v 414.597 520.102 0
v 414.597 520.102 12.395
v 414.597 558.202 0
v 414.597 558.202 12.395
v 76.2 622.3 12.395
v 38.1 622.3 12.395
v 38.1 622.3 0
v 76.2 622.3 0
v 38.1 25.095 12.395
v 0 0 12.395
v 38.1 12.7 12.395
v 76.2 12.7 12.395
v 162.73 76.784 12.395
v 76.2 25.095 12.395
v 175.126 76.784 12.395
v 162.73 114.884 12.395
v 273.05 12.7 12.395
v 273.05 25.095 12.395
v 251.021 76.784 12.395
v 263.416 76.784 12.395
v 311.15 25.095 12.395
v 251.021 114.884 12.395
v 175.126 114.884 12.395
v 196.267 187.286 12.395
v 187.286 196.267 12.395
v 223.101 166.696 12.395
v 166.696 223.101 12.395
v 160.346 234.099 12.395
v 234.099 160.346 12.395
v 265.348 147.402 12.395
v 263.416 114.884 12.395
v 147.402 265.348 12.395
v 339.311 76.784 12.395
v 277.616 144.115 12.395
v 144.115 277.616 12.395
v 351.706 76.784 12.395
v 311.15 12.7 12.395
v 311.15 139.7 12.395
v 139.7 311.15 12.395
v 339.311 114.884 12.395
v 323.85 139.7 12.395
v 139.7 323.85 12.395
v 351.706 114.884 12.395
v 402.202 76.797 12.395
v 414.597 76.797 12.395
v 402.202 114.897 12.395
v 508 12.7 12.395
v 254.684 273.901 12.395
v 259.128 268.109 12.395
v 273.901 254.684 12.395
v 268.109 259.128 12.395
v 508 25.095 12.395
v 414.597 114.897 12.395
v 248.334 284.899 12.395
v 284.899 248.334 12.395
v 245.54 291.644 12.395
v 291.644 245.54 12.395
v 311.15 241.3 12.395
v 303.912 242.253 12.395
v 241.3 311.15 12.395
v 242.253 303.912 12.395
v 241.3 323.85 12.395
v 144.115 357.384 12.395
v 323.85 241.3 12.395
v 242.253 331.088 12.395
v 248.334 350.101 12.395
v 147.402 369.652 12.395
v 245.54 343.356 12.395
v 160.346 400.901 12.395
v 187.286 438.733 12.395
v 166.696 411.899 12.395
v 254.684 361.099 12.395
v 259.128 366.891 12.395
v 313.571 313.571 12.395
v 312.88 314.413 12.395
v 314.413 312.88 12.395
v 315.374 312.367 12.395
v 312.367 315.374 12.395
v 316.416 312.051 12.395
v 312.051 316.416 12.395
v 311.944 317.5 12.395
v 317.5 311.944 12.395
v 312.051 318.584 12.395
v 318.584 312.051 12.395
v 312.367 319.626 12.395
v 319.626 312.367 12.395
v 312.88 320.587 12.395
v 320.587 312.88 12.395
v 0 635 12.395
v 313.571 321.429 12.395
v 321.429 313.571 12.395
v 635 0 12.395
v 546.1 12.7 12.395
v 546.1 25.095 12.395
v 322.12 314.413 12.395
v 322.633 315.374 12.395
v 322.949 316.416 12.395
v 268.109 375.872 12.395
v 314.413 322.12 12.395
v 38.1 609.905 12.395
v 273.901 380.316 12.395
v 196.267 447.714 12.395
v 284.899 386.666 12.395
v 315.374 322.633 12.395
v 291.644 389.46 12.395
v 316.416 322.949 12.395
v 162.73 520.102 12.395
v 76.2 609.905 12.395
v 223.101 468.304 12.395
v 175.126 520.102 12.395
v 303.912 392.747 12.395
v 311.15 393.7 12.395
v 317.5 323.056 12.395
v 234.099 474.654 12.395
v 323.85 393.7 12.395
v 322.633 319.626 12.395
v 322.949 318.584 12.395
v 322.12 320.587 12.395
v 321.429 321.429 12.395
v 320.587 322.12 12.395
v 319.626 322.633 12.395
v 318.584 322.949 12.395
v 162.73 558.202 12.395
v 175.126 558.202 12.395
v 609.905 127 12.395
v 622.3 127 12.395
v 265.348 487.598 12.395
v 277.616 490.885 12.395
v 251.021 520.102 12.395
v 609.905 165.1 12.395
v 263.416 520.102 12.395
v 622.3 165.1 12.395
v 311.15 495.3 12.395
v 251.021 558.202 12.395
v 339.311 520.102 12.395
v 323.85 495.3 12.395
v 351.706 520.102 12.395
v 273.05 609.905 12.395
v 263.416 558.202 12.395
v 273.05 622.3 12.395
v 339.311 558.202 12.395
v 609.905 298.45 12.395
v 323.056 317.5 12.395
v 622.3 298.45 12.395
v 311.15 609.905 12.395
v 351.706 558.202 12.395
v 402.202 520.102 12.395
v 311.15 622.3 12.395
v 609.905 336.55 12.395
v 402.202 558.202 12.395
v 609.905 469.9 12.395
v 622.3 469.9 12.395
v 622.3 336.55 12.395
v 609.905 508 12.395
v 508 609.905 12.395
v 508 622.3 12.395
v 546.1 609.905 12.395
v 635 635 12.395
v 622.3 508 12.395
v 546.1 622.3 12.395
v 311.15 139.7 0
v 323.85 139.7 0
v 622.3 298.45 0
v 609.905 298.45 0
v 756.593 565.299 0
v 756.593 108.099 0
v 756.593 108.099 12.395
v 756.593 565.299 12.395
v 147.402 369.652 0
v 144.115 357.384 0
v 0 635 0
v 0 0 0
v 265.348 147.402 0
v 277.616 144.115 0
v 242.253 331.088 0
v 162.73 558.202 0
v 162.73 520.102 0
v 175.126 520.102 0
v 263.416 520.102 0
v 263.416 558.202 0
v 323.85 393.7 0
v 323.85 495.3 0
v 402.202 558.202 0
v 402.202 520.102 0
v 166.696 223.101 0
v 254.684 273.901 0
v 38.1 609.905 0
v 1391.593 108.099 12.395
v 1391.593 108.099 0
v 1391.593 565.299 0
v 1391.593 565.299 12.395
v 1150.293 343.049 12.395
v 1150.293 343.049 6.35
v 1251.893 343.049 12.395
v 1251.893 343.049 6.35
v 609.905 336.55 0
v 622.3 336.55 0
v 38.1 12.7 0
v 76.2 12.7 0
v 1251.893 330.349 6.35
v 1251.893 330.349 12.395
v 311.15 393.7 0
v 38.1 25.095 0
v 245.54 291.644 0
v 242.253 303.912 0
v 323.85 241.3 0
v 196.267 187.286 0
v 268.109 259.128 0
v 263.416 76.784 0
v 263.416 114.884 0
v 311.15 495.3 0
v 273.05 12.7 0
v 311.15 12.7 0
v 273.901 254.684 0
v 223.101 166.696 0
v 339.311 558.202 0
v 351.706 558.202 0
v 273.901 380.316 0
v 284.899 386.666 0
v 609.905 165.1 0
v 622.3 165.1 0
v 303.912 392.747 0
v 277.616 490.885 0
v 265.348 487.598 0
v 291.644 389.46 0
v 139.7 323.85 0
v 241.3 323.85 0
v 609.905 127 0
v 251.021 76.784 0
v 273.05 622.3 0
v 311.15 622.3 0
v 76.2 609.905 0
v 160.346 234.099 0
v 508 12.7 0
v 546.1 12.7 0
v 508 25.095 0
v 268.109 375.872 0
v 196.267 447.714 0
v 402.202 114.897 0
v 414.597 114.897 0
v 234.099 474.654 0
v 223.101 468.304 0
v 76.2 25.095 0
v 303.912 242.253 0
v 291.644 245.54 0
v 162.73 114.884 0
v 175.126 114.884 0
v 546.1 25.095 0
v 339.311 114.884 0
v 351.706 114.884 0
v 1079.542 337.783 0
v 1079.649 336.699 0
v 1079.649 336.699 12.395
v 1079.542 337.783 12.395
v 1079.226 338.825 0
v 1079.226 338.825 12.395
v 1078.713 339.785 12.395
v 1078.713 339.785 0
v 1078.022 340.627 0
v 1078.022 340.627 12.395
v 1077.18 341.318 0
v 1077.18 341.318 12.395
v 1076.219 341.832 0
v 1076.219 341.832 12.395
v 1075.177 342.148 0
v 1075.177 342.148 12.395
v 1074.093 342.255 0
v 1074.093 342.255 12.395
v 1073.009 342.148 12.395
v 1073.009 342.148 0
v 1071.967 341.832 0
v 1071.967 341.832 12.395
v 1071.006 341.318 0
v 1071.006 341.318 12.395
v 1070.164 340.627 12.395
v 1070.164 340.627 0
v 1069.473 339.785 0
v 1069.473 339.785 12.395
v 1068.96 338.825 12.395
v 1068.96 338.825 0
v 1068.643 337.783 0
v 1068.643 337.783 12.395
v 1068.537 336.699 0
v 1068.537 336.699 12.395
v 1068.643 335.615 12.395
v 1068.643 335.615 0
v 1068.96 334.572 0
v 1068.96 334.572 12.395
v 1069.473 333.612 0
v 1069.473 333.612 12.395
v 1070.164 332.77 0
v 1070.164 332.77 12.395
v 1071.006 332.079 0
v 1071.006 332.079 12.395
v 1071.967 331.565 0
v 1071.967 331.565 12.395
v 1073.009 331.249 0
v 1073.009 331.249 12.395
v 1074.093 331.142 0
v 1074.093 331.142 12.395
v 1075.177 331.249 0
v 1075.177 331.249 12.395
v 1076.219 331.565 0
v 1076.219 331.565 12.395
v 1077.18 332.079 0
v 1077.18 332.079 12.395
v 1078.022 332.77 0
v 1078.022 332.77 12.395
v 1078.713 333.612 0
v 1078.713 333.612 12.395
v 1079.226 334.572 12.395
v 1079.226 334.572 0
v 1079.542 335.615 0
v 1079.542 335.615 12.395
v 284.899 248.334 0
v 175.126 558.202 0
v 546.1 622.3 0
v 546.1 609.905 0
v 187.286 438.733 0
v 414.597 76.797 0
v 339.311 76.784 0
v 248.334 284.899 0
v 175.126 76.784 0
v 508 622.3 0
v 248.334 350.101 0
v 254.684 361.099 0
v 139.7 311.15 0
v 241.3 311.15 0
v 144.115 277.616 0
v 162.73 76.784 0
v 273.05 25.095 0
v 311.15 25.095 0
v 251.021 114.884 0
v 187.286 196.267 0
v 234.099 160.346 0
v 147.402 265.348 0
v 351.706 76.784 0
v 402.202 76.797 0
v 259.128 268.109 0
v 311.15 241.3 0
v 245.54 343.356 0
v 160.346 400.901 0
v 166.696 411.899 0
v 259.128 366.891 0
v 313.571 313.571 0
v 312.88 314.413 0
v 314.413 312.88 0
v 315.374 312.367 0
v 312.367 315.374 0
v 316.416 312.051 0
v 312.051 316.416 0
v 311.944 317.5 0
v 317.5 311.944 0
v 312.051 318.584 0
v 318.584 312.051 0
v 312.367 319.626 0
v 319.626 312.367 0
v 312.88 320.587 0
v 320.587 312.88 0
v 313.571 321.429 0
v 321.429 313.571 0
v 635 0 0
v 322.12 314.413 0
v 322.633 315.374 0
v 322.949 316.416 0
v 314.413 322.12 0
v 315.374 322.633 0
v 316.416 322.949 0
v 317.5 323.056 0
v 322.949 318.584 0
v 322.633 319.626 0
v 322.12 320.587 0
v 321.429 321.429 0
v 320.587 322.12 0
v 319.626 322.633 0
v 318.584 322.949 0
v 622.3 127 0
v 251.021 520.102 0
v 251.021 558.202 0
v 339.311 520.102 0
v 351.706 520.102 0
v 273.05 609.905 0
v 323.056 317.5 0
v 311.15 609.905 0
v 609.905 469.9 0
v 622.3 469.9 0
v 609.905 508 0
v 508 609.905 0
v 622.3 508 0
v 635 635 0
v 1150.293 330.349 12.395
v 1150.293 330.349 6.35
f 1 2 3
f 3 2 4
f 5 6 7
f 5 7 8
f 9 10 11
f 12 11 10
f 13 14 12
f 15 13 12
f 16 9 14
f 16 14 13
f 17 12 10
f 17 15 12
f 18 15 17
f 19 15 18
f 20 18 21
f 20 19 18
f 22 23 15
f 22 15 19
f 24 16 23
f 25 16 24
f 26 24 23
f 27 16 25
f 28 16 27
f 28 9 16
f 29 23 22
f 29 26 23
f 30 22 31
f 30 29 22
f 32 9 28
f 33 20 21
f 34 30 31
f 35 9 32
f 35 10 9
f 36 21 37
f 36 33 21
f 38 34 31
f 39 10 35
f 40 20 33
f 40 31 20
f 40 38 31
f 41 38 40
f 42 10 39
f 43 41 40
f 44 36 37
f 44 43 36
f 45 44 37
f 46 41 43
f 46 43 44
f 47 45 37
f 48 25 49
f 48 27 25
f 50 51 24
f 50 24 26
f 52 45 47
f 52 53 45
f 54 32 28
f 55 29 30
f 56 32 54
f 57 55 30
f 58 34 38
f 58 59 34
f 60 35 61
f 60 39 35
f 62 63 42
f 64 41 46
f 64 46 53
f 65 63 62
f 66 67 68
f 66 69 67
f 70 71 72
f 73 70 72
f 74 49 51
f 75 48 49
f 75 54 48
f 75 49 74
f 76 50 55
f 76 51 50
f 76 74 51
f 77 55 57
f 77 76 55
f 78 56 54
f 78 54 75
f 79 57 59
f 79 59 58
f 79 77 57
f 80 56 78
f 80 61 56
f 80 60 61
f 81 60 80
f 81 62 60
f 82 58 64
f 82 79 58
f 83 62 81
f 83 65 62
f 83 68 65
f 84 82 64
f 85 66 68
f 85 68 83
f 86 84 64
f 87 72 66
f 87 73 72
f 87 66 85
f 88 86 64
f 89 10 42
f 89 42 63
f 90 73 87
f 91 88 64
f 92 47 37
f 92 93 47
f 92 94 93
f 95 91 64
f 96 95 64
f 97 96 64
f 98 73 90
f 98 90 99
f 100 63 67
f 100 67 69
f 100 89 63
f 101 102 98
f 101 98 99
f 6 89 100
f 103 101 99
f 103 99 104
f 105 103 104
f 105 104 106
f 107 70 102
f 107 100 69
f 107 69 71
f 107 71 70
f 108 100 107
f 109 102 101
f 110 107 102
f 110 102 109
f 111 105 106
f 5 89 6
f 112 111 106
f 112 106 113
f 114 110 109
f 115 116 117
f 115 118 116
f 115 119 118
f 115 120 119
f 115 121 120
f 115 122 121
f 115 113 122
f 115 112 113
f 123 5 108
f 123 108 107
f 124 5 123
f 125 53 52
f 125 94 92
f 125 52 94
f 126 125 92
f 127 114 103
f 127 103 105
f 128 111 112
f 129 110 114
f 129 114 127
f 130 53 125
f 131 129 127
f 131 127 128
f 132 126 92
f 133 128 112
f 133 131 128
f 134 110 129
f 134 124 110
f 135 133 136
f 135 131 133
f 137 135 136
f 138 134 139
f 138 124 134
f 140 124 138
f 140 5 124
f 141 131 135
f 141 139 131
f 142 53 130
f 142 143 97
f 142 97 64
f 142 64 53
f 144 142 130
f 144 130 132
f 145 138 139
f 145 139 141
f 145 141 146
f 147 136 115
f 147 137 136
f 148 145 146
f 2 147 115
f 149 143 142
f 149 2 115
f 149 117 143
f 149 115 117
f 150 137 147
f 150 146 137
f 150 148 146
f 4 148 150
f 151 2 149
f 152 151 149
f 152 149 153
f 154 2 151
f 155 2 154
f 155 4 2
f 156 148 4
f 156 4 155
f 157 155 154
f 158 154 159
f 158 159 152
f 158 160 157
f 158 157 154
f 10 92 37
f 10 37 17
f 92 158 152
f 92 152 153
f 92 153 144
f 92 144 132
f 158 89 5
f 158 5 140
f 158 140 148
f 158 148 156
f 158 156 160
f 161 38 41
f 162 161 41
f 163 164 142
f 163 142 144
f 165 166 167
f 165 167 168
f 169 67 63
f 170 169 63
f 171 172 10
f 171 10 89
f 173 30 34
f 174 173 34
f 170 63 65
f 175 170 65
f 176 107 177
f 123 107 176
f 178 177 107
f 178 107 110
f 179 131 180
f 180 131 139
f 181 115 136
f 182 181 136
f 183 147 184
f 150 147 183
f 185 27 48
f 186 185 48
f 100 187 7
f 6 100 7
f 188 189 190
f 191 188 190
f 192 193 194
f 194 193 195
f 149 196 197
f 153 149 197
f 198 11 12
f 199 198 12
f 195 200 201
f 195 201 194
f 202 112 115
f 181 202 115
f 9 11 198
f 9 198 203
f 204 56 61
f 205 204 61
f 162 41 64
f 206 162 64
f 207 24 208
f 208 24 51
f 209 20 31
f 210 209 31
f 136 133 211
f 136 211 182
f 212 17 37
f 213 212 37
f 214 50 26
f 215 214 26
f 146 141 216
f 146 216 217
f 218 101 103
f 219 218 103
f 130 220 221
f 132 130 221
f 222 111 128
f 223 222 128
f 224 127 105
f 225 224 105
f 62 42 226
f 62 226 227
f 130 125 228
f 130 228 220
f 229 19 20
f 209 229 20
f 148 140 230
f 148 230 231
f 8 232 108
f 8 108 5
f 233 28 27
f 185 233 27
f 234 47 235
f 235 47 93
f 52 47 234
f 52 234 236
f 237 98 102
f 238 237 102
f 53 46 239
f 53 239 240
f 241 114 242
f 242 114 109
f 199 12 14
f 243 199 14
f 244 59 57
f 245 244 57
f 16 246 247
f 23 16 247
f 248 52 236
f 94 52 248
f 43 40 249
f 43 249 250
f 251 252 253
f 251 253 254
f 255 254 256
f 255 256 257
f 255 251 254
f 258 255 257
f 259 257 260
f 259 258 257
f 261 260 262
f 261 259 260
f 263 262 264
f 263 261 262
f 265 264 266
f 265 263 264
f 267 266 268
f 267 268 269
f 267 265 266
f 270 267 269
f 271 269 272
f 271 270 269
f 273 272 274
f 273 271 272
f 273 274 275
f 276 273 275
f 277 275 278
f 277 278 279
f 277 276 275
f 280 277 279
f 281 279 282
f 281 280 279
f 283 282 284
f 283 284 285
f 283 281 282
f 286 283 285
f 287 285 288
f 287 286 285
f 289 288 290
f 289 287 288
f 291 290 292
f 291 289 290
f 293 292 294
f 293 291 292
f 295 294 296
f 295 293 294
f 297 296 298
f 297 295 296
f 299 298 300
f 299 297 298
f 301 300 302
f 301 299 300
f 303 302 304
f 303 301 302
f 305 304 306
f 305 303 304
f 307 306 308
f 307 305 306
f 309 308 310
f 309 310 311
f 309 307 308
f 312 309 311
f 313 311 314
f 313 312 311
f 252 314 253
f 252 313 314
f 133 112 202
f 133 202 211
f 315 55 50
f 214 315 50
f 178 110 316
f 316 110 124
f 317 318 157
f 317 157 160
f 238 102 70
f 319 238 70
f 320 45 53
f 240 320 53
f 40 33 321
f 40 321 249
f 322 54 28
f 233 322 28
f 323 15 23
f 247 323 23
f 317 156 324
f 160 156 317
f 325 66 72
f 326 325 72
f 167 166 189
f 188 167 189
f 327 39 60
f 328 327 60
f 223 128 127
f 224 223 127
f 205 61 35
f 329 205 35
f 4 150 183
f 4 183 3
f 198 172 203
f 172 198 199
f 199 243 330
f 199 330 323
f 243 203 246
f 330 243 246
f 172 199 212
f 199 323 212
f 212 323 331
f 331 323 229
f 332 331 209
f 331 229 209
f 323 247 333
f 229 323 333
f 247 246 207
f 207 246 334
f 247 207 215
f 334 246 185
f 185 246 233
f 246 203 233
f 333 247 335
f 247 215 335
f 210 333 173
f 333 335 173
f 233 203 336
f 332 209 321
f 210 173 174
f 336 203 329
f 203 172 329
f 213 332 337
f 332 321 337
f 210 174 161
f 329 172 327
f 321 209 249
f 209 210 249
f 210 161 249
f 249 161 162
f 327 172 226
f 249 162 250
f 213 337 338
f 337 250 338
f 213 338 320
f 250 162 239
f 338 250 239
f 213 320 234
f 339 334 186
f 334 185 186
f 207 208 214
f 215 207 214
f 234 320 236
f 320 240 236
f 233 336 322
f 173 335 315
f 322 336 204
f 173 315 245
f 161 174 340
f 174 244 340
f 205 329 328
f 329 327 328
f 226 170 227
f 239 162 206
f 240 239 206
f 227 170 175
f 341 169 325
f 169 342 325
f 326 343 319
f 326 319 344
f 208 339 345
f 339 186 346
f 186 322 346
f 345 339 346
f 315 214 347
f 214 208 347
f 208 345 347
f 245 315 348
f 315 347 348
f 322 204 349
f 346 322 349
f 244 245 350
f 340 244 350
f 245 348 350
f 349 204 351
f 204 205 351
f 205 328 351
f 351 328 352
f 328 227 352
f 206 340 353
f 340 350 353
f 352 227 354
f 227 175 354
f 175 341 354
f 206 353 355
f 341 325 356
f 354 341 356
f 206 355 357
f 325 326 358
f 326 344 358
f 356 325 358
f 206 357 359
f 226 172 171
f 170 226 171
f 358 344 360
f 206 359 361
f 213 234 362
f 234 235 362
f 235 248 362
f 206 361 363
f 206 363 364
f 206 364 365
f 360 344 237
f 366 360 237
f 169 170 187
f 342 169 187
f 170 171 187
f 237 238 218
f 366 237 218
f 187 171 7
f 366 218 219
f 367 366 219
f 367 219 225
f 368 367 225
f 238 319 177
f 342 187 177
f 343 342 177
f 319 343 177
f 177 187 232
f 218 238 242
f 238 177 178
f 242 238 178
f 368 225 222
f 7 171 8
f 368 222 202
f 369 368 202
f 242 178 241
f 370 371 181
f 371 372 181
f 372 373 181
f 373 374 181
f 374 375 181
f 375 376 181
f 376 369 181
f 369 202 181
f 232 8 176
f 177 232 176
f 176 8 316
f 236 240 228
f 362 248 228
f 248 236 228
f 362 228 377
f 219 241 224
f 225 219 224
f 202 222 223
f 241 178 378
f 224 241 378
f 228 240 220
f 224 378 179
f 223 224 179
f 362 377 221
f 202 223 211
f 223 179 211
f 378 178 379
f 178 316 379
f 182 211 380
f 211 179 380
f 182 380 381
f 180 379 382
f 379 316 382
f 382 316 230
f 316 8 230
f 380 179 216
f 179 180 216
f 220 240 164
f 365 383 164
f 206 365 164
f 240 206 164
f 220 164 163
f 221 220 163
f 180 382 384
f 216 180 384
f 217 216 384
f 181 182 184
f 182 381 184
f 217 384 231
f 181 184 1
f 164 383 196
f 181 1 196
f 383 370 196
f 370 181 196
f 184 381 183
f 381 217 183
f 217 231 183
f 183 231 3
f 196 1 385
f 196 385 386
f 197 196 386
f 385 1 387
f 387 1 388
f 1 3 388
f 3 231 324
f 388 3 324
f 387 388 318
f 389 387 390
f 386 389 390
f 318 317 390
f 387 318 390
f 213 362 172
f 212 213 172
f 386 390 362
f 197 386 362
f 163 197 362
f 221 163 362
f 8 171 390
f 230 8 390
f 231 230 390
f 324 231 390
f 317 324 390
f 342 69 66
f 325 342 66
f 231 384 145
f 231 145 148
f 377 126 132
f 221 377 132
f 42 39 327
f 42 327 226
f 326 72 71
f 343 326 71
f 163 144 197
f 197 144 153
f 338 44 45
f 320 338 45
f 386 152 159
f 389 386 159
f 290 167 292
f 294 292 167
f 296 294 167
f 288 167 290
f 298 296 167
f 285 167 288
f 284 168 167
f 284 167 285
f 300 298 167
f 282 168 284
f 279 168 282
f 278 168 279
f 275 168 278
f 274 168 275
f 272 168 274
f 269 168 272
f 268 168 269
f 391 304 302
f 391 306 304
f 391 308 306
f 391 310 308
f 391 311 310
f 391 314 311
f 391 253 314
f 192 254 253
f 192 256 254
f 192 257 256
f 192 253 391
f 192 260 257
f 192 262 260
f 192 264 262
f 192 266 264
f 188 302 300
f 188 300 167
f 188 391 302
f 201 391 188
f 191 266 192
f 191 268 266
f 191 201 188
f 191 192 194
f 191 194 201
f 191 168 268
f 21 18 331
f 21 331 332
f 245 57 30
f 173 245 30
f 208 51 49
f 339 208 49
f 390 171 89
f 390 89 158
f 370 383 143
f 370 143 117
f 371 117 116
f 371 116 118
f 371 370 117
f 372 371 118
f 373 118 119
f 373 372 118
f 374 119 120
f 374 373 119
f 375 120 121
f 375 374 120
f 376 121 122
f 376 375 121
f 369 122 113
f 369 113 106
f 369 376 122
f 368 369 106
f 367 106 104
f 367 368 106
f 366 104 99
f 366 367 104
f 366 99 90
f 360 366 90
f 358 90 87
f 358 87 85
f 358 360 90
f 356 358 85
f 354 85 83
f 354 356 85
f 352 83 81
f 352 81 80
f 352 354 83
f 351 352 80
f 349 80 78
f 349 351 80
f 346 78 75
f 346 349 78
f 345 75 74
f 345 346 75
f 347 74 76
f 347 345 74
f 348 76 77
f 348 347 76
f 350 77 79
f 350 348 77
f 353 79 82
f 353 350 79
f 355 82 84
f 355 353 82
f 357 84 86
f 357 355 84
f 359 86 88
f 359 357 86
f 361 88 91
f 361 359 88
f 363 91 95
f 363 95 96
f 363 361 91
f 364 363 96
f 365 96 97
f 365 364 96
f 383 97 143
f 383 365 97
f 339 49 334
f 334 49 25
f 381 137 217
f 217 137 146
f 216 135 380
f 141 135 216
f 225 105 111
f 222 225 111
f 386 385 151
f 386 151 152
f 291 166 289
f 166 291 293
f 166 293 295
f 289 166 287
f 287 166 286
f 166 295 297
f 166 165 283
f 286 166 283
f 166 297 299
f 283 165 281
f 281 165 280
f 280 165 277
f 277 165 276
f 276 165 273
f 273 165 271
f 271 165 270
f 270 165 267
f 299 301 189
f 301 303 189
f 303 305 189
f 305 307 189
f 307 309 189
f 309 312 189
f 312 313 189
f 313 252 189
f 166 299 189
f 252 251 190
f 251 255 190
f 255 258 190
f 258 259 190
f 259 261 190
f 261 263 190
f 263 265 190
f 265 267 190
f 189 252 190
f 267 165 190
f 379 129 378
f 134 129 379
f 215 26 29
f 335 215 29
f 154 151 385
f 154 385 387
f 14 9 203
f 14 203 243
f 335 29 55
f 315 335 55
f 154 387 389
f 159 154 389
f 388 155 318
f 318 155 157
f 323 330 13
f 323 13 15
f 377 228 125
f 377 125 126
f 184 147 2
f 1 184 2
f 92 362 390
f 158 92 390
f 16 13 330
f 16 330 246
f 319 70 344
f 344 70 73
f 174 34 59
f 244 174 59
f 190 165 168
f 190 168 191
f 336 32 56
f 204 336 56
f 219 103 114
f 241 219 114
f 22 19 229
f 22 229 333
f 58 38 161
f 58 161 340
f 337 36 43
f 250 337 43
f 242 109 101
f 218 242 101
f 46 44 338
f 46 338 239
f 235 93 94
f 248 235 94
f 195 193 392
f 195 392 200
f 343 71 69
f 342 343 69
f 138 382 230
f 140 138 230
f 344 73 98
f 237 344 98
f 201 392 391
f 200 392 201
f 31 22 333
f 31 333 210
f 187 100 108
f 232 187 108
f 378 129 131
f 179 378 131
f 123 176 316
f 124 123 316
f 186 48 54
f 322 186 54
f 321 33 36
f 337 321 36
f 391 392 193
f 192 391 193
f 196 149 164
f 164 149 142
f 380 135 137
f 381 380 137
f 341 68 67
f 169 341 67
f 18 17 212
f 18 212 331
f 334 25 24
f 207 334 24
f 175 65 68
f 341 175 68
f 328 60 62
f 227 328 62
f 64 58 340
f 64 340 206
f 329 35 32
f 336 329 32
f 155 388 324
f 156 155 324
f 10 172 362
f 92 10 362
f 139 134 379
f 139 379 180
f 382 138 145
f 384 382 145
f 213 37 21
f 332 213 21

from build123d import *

# Parameters (mm, degrees)
F0_W     = 635
F0_H     = 635
F0_R     = 5.55625
F1_DEPTH = 12.3952
F0_H_2   = 457.2
F0_W_2   = 101.6
F0_H_3   = 12.7
F2_W     = 38.1
F2_H     = 12.3952
F2_W_2   = 12.3952
F2_H_2   = 38.1
F2_H_3   = 19.05
F3_DEPTH = 12.3952
F4_DEPTH = 6.35
F5_W     = 12.7
F5_H     = 101.6
F5_W_2   = 101.6
F5_H_2   = 12.7
F6_DEPTH = 12.3952


# Not quite as in the source:
# - a feature names something its author has since deleted; it is built from what else it names


with BuildPart() as f1:
    # F0 (on Top) → F1 (new body)
    with BuildSketch(Plane.XY):
        with Locations((317.5, 317.5)):
            Rectangle(F0_W, F0_H)
        with Locations((317.5, 317.5)):
            Circle(F0_R, mode=Mode.SUBTRACT)
    extrude(amount=F1_DEPTH)

    # F2 (on face) → F3 (cut)
    with BuildSketch(Plane.XY.offset(12.3952)):
        with Locations((57.15, 616.1024)):
            Rectangle(F2_W, F2_H)
        with Locations((292.1, 616.1024)):
            Rectangle(F2_W, F2_H)
        with Locations((527.05, 616.1024)):
            Rectangle(F2_W, F2_H)
        with Locations((57.15, 18.8976)):
            Rectangle(F2_W, F2_H)
        with Locations((292.1, 18.8976)):
            Rectangle(F2_W, F2_H)
        with Locations((527.05, 18.8976)):
            Rectangle(F2_W, F2_H)
        with Locations((616.1024, 488.95)):
            Rectangle(F2_W_2, F2_H_2)
        with Locations((616.1024, 327.025)):
            Rectangle(F2_W_2, F2_H_3)
        with Locations((616.1024, 146.05)):
            Rectangle(F2_W_2, F2_H_2)
        with Locations((408.399107, 95.8469)):
            Rectangle(F2_W_2, F2_H_2)
        with Locations((345.508707, 95.8342)):
            Rectangle(F2_W_2, F2_H_2)
        with Locations((168.927907, 95.8342)):
            Rectangle(F2_W_2, F2_H_2)
        with Locations((257.218307, 95.8342)):
            Rectangle(F2_W_2, F2_H_2)
        with Locations((168.927907, 539.1522364)):
            Rectangle(F2_W_2, F2_H_2)
        with Locations((257.218307, 539.1522364)):
            Rectangle(F2_W_2, F2_H_2)
        with Locations((345.508707, 539.1522364)):
            Rectangle(F2_W_2, F2_H_2)
        with Locations((408.399107, 539.1522364)):
            Rectangle(F2_W_2, F2_H_2)
        with Locations((616.1024, 307.975)):
            Rectangle(F2_W_2, F2_H_3)
    extrude(amount=-F3_DEPTH, mode=Mode.SUBTRACT)

    # F5 (on face) → F6 (cut, through all)
    with BuildSketch(Plane.XY.offset(12.3952)):
        with Locations((317.5, 444.5)):
            Rectangle(F5_W, F5_H)
        Polygon((303.9116177601, 392.7470488996), (277.6156027777, 490.8851128506), (265.3483447838, 487.5981109778), (291.6443597663, 389.4600470268), align=None)
        Polygon((284.899261314, 386.6661357684), (234.099261314, 474.6543167929), (223.100738686, 468.3043167929), (273.900738686, 380.3161357684), align=None)
        Polygon((259.1283352131, 366.8914086659), (268.1085913341, 375.8716647869), (196.2665423656, 447.7137137555), (187.2862862445, 438.7334576344), align=None)
        Polygon((248.3338642316, 350.100738686), (254.6838642316, 361.099261314), (166.6956832071, 411.899261314), (160.3456832071, 400.900738686), align=None)
        Polygon((242.2529511004, 331.0883822399), (245.5399529732, 343.3556402337), (147.4018890222, 369.6516552162), (144.1148871494, 357.3843972223), align=None)
        with Locations((190.5, 317.5)):
            Rectangle(F5_W_2, F5_H_2)
        Polygon((245.5399529732, 291.6443597663), (242.2529511004, 303.9116177601), (144.1148871494, 277.6156027777), (147.4018890222, 265.3483447838), align=None)
        Polygon((254.6838642316, 273.900738686), (248.3338642316, 284.899261314), (160.3456832071, 234.099261314), (166.6956832071, 223.100738686), align=None)
        Polygon((268.1085913341, 259.1283352131), (259.1283352131, 268.1085913341), (187.2862862445, 196.2665423656), (196.2665423656, 187.2862862445), align=None)
        Polygon((284.899261314, 248.3338642316), (273.900738686, 254.6838642316), (223.100738686, 166.6956832071), (234.099261314, 160.3456832071), align=None)
        Polygon((303.9116177601, 242.2529511004), (291.6443597663, 245.5399529732), (265.3483447838, 147.4018890222), (277.6156027777, 144.1148871494), align=None)
        with Locations((317.5, 190.5)):
            Rectangle(F5_W, F5_H)
    extrude(amount=-F6_DEPTH, mode=Mode.SUBTRACT)


with BuildPart() as f1b:
    # F0 (on Top) → F1, piece 2 (new body)
    with BuildSketch(Plane.XY):
        with Locations((1074.0928434372, 336.6985905102)):
            Rectangle(F0_W, F0_H_2)
        with Locations((1074.0928434372, 336.6985905102)):
            Circle(F0_R, mode=Mode.SUBTRACT)
        with Locations((1201.0928434372, 336.6985905102)):
            Rectangle(F0_W_2, F0_H_3, mode=Mode.SUBTRACT)
    extrude(amount=F1_DEPTH)

    # F0 (on Top) → F4 (join)
    with BuildSketch(Plane.XY):
        with Locations((1201.0928434372, 336.6985905102)):
            Rectangle(F0_W_2, F0_H_3)
    extrude(amount=F4_DEPTH)


solid = Compound([f1.part, f1b.part])
